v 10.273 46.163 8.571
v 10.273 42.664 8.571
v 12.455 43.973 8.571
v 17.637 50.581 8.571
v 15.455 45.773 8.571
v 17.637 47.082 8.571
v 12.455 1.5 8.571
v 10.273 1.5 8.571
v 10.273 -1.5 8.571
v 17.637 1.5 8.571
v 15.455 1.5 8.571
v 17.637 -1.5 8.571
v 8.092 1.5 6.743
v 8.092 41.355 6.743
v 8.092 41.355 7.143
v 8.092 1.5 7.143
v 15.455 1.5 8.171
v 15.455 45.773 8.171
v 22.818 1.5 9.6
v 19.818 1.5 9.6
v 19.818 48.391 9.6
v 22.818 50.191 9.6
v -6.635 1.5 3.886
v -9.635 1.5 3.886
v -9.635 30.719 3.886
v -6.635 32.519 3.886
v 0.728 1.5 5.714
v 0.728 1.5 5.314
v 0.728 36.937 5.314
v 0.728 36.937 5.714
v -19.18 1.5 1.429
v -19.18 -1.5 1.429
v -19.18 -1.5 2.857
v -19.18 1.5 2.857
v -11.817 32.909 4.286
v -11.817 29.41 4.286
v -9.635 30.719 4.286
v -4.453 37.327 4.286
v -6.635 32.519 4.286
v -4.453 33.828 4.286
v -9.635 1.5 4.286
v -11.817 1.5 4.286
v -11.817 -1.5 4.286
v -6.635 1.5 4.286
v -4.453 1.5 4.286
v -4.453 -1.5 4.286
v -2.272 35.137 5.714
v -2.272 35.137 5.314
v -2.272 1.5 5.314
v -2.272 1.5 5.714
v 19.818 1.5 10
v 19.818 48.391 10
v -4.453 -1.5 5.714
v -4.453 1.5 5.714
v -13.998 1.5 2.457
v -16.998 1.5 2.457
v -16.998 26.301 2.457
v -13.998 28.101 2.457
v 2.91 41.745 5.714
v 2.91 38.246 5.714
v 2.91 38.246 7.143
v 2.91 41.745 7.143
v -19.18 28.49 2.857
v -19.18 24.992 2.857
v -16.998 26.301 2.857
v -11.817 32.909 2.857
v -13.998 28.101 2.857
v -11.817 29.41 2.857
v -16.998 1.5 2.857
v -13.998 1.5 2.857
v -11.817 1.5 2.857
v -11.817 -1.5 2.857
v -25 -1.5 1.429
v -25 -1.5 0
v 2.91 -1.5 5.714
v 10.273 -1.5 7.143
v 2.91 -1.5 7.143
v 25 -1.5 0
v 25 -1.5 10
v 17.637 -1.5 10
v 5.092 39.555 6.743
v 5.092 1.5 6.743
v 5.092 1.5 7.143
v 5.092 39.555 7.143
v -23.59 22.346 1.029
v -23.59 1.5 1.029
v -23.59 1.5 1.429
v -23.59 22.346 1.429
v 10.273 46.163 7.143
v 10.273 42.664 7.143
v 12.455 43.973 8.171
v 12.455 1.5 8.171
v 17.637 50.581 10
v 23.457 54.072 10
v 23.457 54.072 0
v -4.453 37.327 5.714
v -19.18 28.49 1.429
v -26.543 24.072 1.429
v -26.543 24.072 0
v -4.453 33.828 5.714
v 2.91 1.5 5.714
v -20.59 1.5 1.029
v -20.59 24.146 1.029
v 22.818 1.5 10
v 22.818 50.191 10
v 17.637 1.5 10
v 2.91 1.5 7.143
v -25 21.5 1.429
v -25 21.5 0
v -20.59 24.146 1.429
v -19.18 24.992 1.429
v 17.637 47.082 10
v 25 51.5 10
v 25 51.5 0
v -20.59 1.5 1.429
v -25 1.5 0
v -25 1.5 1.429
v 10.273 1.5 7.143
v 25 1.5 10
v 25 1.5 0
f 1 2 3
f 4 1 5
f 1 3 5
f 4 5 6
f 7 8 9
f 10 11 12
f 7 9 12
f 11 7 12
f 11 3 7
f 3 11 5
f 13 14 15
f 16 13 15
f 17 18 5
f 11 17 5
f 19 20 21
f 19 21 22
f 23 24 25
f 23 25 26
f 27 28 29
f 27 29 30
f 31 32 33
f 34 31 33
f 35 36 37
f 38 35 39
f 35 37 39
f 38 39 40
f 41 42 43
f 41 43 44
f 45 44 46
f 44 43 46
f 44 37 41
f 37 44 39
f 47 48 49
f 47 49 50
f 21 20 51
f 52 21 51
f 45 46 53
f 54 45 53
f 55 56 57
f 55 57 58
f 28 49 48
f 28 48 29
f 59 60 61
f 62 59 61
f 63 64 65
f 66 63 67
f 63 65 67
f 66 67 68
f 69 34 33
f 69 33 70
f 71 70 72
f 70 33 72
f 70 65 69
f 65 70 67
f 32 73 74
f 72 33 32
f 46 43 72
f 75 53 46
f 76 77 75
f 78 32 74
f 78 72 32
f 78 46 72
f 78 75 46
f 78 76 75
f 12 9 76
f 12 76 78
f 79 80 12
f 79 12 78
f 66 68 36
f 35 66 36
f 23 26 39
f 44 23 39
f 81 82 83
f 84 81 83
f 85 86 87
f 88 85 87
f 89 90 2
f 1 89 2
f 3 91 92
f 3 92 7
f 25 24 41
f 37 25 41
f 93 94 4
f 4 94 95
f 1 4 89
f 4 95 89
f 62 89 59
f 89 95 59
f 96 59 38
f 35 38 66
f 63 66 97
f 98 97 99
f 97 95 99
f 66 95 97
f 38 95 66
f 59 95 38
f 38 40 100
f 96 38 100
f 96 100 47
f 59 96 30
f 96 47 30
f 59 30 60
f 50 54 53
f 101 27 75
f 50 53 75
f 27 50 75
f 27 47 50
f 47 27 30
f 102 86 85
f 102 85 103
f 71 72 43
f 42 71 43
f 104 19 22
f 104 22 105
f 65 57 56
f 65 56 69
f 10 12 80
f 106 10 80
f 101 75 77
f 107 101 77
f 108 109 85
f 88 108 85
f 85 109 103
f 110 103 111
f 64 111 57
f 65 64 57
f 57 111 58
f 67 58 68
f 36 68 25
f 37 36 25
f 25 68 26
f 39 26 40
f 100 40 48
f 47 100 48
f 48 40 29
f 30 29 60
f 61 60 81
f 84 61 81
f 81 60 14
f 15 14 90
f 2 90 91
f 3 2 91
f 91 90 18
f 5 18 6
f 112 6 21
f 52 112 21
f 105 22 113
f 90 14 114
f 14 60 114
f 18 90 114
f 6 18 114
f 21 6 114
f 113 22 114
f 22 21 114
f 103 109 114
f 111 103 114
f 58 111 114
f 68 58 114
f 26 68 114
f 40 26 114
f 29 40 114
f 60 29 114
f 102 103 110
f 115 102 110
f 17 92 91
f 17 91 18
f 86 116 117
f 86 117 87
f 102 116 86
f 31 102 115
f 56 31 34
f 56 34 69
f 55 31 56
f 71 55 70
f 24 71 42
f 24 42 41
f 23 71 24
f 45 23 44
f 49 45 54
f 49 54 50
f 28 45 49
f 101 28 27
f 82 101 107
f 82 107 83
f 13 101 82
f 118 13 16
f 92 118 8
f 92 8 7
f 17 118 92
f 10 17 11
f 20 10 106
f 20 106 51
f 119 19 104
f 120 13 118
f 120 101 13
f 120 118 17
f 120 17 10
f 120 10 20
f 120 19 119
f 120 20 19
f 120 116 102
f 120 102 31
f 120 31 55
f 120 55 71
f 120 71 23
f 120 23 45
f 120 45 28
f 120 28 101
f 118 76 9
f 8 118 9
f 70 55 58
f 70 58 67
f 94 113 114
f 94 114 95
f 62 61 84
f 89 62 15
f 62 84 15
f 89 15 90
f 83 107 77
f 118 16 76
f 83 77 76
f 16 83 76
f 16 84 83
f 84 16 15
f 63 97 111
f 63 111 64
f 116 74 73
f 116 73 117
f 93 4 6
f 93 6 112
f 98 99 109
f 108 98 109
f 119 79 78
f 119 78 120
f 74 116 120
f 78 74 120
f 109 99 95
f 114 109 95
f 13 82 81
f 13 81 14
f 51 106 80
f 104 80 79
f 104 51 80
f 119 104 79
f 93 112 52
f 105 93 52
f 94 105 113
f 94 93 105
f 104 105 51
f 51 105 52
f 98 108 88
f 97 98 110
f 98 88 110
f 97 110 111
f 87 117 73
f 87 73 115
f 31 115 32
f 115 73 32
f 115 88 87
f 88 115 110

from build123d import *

# Parameters (mm, degrees)
F0_W     = 50
F0_H     = 3
F1_DEPTH = 10
F3_DEPTH = 55.5734787771
F4_W     = 3
F4_H     = 0.4
F5_REACH = 58.6000279672


with BuildPart() as f1:
    # F0 (on Top) → F1 (new body)
    with BuildSketch(Plane.XY):
        Rectangle(F0_W, F0_H)
    extrude(amount=F1_DEPTH)


with BuildPart() as f1b:
    # F0 (on Top) → F1, piece 2 (new body)
    with BuildSketch(Plane.XY):
        Polygon((-26.5434872663, 24.0724787771), (-25, 21.5), (25, 51.5), (23.4565127337, 54.0724787771), align=None)
    extrude(amount=F1_DEPTH)


with BuildPart() as f3_tool:
    # F2 (on face) → F3 (new body, through all)
    with BuildSketch(Plane.XZ.offset(1.5)):
        Polygon((17.6366446762, 10), (-26.5434872663, 10), (-26.5434872663, 1.4285714286), (-19.1801319425, 1.4285714286), (-19.1801319425, 2.8571428571), (-11.8167766188, 2.8571428571), (-11.8167766188, 4.2857142857), (-4.453421295, 4.2857142857), (-4.453421295, 5.7142857143), (2.9099340287, 5.7142857143), (2.9099340287, 7.1428571429), (10.2732893525, 7.1428571429), (10.2732893525, 8.5714285714), (17.6366446762, 8.5714285714), align=None)
    extrude(amount=-F3_DEPTH)


with BuildPart() as f1_1:
    add(f1.part)

    # F3: cut by f3_tool
    add(f3_tool.part, mode=Mode.SUBTRACT)



with BuildPart() as f1b_1:
    add(f1b.part)

    # F3: cut by f3_tool
    add(f3_tool.part, mode=Mode.SUBTRACT)


with BuildPart() as f1_2:
    add(f1_1.part)

    add(f1b_1.part)  # F5 merges F1b
    f5_end = f1_2.faces().sort_by_distance((5.616262324, 43.3683285313, 3.4924250952))[0]
    # F4 (on face) → F5 (join, up to a face of the model that its end follows)
    with BuildSketch(Plane.XZ.offset(1.5)):
        with Locations((-22.0900659713, 1.2285714286)):
            Rectangle(F4_W, F4_H)
        with Locations((-15.4984542807, 2.6571428571)):
            Rectangle(F4_W, F4_H)
        with Locations((-8.1350989569, 4.0857142857)):
            Rectangle(F4_W, F4_H)
        with Locations((-0.7717436331, 5.5142857143)):
            Rectangle(F4_W, F4_H)
        with Locations((6.5916116906, 6.9428571429)):
            Rectangle(F4_W, F4_H)
        with Locations((13.9549670144, 8.3714285714)):
            Rectangle(F4_W, F4_H)
        with Locations((21.3183223381, 9.8)):
            Rectangle(F4_W, F4_H)
    f5_long = extrude(amount=-F5_REACH, mode=Mode.PRIVATE)
    add(split(f5_long, bisect_by=f5_end, keep=Keep.BOTTOM, mode=Mode.PRIVATE))


solid = f1_2.part
